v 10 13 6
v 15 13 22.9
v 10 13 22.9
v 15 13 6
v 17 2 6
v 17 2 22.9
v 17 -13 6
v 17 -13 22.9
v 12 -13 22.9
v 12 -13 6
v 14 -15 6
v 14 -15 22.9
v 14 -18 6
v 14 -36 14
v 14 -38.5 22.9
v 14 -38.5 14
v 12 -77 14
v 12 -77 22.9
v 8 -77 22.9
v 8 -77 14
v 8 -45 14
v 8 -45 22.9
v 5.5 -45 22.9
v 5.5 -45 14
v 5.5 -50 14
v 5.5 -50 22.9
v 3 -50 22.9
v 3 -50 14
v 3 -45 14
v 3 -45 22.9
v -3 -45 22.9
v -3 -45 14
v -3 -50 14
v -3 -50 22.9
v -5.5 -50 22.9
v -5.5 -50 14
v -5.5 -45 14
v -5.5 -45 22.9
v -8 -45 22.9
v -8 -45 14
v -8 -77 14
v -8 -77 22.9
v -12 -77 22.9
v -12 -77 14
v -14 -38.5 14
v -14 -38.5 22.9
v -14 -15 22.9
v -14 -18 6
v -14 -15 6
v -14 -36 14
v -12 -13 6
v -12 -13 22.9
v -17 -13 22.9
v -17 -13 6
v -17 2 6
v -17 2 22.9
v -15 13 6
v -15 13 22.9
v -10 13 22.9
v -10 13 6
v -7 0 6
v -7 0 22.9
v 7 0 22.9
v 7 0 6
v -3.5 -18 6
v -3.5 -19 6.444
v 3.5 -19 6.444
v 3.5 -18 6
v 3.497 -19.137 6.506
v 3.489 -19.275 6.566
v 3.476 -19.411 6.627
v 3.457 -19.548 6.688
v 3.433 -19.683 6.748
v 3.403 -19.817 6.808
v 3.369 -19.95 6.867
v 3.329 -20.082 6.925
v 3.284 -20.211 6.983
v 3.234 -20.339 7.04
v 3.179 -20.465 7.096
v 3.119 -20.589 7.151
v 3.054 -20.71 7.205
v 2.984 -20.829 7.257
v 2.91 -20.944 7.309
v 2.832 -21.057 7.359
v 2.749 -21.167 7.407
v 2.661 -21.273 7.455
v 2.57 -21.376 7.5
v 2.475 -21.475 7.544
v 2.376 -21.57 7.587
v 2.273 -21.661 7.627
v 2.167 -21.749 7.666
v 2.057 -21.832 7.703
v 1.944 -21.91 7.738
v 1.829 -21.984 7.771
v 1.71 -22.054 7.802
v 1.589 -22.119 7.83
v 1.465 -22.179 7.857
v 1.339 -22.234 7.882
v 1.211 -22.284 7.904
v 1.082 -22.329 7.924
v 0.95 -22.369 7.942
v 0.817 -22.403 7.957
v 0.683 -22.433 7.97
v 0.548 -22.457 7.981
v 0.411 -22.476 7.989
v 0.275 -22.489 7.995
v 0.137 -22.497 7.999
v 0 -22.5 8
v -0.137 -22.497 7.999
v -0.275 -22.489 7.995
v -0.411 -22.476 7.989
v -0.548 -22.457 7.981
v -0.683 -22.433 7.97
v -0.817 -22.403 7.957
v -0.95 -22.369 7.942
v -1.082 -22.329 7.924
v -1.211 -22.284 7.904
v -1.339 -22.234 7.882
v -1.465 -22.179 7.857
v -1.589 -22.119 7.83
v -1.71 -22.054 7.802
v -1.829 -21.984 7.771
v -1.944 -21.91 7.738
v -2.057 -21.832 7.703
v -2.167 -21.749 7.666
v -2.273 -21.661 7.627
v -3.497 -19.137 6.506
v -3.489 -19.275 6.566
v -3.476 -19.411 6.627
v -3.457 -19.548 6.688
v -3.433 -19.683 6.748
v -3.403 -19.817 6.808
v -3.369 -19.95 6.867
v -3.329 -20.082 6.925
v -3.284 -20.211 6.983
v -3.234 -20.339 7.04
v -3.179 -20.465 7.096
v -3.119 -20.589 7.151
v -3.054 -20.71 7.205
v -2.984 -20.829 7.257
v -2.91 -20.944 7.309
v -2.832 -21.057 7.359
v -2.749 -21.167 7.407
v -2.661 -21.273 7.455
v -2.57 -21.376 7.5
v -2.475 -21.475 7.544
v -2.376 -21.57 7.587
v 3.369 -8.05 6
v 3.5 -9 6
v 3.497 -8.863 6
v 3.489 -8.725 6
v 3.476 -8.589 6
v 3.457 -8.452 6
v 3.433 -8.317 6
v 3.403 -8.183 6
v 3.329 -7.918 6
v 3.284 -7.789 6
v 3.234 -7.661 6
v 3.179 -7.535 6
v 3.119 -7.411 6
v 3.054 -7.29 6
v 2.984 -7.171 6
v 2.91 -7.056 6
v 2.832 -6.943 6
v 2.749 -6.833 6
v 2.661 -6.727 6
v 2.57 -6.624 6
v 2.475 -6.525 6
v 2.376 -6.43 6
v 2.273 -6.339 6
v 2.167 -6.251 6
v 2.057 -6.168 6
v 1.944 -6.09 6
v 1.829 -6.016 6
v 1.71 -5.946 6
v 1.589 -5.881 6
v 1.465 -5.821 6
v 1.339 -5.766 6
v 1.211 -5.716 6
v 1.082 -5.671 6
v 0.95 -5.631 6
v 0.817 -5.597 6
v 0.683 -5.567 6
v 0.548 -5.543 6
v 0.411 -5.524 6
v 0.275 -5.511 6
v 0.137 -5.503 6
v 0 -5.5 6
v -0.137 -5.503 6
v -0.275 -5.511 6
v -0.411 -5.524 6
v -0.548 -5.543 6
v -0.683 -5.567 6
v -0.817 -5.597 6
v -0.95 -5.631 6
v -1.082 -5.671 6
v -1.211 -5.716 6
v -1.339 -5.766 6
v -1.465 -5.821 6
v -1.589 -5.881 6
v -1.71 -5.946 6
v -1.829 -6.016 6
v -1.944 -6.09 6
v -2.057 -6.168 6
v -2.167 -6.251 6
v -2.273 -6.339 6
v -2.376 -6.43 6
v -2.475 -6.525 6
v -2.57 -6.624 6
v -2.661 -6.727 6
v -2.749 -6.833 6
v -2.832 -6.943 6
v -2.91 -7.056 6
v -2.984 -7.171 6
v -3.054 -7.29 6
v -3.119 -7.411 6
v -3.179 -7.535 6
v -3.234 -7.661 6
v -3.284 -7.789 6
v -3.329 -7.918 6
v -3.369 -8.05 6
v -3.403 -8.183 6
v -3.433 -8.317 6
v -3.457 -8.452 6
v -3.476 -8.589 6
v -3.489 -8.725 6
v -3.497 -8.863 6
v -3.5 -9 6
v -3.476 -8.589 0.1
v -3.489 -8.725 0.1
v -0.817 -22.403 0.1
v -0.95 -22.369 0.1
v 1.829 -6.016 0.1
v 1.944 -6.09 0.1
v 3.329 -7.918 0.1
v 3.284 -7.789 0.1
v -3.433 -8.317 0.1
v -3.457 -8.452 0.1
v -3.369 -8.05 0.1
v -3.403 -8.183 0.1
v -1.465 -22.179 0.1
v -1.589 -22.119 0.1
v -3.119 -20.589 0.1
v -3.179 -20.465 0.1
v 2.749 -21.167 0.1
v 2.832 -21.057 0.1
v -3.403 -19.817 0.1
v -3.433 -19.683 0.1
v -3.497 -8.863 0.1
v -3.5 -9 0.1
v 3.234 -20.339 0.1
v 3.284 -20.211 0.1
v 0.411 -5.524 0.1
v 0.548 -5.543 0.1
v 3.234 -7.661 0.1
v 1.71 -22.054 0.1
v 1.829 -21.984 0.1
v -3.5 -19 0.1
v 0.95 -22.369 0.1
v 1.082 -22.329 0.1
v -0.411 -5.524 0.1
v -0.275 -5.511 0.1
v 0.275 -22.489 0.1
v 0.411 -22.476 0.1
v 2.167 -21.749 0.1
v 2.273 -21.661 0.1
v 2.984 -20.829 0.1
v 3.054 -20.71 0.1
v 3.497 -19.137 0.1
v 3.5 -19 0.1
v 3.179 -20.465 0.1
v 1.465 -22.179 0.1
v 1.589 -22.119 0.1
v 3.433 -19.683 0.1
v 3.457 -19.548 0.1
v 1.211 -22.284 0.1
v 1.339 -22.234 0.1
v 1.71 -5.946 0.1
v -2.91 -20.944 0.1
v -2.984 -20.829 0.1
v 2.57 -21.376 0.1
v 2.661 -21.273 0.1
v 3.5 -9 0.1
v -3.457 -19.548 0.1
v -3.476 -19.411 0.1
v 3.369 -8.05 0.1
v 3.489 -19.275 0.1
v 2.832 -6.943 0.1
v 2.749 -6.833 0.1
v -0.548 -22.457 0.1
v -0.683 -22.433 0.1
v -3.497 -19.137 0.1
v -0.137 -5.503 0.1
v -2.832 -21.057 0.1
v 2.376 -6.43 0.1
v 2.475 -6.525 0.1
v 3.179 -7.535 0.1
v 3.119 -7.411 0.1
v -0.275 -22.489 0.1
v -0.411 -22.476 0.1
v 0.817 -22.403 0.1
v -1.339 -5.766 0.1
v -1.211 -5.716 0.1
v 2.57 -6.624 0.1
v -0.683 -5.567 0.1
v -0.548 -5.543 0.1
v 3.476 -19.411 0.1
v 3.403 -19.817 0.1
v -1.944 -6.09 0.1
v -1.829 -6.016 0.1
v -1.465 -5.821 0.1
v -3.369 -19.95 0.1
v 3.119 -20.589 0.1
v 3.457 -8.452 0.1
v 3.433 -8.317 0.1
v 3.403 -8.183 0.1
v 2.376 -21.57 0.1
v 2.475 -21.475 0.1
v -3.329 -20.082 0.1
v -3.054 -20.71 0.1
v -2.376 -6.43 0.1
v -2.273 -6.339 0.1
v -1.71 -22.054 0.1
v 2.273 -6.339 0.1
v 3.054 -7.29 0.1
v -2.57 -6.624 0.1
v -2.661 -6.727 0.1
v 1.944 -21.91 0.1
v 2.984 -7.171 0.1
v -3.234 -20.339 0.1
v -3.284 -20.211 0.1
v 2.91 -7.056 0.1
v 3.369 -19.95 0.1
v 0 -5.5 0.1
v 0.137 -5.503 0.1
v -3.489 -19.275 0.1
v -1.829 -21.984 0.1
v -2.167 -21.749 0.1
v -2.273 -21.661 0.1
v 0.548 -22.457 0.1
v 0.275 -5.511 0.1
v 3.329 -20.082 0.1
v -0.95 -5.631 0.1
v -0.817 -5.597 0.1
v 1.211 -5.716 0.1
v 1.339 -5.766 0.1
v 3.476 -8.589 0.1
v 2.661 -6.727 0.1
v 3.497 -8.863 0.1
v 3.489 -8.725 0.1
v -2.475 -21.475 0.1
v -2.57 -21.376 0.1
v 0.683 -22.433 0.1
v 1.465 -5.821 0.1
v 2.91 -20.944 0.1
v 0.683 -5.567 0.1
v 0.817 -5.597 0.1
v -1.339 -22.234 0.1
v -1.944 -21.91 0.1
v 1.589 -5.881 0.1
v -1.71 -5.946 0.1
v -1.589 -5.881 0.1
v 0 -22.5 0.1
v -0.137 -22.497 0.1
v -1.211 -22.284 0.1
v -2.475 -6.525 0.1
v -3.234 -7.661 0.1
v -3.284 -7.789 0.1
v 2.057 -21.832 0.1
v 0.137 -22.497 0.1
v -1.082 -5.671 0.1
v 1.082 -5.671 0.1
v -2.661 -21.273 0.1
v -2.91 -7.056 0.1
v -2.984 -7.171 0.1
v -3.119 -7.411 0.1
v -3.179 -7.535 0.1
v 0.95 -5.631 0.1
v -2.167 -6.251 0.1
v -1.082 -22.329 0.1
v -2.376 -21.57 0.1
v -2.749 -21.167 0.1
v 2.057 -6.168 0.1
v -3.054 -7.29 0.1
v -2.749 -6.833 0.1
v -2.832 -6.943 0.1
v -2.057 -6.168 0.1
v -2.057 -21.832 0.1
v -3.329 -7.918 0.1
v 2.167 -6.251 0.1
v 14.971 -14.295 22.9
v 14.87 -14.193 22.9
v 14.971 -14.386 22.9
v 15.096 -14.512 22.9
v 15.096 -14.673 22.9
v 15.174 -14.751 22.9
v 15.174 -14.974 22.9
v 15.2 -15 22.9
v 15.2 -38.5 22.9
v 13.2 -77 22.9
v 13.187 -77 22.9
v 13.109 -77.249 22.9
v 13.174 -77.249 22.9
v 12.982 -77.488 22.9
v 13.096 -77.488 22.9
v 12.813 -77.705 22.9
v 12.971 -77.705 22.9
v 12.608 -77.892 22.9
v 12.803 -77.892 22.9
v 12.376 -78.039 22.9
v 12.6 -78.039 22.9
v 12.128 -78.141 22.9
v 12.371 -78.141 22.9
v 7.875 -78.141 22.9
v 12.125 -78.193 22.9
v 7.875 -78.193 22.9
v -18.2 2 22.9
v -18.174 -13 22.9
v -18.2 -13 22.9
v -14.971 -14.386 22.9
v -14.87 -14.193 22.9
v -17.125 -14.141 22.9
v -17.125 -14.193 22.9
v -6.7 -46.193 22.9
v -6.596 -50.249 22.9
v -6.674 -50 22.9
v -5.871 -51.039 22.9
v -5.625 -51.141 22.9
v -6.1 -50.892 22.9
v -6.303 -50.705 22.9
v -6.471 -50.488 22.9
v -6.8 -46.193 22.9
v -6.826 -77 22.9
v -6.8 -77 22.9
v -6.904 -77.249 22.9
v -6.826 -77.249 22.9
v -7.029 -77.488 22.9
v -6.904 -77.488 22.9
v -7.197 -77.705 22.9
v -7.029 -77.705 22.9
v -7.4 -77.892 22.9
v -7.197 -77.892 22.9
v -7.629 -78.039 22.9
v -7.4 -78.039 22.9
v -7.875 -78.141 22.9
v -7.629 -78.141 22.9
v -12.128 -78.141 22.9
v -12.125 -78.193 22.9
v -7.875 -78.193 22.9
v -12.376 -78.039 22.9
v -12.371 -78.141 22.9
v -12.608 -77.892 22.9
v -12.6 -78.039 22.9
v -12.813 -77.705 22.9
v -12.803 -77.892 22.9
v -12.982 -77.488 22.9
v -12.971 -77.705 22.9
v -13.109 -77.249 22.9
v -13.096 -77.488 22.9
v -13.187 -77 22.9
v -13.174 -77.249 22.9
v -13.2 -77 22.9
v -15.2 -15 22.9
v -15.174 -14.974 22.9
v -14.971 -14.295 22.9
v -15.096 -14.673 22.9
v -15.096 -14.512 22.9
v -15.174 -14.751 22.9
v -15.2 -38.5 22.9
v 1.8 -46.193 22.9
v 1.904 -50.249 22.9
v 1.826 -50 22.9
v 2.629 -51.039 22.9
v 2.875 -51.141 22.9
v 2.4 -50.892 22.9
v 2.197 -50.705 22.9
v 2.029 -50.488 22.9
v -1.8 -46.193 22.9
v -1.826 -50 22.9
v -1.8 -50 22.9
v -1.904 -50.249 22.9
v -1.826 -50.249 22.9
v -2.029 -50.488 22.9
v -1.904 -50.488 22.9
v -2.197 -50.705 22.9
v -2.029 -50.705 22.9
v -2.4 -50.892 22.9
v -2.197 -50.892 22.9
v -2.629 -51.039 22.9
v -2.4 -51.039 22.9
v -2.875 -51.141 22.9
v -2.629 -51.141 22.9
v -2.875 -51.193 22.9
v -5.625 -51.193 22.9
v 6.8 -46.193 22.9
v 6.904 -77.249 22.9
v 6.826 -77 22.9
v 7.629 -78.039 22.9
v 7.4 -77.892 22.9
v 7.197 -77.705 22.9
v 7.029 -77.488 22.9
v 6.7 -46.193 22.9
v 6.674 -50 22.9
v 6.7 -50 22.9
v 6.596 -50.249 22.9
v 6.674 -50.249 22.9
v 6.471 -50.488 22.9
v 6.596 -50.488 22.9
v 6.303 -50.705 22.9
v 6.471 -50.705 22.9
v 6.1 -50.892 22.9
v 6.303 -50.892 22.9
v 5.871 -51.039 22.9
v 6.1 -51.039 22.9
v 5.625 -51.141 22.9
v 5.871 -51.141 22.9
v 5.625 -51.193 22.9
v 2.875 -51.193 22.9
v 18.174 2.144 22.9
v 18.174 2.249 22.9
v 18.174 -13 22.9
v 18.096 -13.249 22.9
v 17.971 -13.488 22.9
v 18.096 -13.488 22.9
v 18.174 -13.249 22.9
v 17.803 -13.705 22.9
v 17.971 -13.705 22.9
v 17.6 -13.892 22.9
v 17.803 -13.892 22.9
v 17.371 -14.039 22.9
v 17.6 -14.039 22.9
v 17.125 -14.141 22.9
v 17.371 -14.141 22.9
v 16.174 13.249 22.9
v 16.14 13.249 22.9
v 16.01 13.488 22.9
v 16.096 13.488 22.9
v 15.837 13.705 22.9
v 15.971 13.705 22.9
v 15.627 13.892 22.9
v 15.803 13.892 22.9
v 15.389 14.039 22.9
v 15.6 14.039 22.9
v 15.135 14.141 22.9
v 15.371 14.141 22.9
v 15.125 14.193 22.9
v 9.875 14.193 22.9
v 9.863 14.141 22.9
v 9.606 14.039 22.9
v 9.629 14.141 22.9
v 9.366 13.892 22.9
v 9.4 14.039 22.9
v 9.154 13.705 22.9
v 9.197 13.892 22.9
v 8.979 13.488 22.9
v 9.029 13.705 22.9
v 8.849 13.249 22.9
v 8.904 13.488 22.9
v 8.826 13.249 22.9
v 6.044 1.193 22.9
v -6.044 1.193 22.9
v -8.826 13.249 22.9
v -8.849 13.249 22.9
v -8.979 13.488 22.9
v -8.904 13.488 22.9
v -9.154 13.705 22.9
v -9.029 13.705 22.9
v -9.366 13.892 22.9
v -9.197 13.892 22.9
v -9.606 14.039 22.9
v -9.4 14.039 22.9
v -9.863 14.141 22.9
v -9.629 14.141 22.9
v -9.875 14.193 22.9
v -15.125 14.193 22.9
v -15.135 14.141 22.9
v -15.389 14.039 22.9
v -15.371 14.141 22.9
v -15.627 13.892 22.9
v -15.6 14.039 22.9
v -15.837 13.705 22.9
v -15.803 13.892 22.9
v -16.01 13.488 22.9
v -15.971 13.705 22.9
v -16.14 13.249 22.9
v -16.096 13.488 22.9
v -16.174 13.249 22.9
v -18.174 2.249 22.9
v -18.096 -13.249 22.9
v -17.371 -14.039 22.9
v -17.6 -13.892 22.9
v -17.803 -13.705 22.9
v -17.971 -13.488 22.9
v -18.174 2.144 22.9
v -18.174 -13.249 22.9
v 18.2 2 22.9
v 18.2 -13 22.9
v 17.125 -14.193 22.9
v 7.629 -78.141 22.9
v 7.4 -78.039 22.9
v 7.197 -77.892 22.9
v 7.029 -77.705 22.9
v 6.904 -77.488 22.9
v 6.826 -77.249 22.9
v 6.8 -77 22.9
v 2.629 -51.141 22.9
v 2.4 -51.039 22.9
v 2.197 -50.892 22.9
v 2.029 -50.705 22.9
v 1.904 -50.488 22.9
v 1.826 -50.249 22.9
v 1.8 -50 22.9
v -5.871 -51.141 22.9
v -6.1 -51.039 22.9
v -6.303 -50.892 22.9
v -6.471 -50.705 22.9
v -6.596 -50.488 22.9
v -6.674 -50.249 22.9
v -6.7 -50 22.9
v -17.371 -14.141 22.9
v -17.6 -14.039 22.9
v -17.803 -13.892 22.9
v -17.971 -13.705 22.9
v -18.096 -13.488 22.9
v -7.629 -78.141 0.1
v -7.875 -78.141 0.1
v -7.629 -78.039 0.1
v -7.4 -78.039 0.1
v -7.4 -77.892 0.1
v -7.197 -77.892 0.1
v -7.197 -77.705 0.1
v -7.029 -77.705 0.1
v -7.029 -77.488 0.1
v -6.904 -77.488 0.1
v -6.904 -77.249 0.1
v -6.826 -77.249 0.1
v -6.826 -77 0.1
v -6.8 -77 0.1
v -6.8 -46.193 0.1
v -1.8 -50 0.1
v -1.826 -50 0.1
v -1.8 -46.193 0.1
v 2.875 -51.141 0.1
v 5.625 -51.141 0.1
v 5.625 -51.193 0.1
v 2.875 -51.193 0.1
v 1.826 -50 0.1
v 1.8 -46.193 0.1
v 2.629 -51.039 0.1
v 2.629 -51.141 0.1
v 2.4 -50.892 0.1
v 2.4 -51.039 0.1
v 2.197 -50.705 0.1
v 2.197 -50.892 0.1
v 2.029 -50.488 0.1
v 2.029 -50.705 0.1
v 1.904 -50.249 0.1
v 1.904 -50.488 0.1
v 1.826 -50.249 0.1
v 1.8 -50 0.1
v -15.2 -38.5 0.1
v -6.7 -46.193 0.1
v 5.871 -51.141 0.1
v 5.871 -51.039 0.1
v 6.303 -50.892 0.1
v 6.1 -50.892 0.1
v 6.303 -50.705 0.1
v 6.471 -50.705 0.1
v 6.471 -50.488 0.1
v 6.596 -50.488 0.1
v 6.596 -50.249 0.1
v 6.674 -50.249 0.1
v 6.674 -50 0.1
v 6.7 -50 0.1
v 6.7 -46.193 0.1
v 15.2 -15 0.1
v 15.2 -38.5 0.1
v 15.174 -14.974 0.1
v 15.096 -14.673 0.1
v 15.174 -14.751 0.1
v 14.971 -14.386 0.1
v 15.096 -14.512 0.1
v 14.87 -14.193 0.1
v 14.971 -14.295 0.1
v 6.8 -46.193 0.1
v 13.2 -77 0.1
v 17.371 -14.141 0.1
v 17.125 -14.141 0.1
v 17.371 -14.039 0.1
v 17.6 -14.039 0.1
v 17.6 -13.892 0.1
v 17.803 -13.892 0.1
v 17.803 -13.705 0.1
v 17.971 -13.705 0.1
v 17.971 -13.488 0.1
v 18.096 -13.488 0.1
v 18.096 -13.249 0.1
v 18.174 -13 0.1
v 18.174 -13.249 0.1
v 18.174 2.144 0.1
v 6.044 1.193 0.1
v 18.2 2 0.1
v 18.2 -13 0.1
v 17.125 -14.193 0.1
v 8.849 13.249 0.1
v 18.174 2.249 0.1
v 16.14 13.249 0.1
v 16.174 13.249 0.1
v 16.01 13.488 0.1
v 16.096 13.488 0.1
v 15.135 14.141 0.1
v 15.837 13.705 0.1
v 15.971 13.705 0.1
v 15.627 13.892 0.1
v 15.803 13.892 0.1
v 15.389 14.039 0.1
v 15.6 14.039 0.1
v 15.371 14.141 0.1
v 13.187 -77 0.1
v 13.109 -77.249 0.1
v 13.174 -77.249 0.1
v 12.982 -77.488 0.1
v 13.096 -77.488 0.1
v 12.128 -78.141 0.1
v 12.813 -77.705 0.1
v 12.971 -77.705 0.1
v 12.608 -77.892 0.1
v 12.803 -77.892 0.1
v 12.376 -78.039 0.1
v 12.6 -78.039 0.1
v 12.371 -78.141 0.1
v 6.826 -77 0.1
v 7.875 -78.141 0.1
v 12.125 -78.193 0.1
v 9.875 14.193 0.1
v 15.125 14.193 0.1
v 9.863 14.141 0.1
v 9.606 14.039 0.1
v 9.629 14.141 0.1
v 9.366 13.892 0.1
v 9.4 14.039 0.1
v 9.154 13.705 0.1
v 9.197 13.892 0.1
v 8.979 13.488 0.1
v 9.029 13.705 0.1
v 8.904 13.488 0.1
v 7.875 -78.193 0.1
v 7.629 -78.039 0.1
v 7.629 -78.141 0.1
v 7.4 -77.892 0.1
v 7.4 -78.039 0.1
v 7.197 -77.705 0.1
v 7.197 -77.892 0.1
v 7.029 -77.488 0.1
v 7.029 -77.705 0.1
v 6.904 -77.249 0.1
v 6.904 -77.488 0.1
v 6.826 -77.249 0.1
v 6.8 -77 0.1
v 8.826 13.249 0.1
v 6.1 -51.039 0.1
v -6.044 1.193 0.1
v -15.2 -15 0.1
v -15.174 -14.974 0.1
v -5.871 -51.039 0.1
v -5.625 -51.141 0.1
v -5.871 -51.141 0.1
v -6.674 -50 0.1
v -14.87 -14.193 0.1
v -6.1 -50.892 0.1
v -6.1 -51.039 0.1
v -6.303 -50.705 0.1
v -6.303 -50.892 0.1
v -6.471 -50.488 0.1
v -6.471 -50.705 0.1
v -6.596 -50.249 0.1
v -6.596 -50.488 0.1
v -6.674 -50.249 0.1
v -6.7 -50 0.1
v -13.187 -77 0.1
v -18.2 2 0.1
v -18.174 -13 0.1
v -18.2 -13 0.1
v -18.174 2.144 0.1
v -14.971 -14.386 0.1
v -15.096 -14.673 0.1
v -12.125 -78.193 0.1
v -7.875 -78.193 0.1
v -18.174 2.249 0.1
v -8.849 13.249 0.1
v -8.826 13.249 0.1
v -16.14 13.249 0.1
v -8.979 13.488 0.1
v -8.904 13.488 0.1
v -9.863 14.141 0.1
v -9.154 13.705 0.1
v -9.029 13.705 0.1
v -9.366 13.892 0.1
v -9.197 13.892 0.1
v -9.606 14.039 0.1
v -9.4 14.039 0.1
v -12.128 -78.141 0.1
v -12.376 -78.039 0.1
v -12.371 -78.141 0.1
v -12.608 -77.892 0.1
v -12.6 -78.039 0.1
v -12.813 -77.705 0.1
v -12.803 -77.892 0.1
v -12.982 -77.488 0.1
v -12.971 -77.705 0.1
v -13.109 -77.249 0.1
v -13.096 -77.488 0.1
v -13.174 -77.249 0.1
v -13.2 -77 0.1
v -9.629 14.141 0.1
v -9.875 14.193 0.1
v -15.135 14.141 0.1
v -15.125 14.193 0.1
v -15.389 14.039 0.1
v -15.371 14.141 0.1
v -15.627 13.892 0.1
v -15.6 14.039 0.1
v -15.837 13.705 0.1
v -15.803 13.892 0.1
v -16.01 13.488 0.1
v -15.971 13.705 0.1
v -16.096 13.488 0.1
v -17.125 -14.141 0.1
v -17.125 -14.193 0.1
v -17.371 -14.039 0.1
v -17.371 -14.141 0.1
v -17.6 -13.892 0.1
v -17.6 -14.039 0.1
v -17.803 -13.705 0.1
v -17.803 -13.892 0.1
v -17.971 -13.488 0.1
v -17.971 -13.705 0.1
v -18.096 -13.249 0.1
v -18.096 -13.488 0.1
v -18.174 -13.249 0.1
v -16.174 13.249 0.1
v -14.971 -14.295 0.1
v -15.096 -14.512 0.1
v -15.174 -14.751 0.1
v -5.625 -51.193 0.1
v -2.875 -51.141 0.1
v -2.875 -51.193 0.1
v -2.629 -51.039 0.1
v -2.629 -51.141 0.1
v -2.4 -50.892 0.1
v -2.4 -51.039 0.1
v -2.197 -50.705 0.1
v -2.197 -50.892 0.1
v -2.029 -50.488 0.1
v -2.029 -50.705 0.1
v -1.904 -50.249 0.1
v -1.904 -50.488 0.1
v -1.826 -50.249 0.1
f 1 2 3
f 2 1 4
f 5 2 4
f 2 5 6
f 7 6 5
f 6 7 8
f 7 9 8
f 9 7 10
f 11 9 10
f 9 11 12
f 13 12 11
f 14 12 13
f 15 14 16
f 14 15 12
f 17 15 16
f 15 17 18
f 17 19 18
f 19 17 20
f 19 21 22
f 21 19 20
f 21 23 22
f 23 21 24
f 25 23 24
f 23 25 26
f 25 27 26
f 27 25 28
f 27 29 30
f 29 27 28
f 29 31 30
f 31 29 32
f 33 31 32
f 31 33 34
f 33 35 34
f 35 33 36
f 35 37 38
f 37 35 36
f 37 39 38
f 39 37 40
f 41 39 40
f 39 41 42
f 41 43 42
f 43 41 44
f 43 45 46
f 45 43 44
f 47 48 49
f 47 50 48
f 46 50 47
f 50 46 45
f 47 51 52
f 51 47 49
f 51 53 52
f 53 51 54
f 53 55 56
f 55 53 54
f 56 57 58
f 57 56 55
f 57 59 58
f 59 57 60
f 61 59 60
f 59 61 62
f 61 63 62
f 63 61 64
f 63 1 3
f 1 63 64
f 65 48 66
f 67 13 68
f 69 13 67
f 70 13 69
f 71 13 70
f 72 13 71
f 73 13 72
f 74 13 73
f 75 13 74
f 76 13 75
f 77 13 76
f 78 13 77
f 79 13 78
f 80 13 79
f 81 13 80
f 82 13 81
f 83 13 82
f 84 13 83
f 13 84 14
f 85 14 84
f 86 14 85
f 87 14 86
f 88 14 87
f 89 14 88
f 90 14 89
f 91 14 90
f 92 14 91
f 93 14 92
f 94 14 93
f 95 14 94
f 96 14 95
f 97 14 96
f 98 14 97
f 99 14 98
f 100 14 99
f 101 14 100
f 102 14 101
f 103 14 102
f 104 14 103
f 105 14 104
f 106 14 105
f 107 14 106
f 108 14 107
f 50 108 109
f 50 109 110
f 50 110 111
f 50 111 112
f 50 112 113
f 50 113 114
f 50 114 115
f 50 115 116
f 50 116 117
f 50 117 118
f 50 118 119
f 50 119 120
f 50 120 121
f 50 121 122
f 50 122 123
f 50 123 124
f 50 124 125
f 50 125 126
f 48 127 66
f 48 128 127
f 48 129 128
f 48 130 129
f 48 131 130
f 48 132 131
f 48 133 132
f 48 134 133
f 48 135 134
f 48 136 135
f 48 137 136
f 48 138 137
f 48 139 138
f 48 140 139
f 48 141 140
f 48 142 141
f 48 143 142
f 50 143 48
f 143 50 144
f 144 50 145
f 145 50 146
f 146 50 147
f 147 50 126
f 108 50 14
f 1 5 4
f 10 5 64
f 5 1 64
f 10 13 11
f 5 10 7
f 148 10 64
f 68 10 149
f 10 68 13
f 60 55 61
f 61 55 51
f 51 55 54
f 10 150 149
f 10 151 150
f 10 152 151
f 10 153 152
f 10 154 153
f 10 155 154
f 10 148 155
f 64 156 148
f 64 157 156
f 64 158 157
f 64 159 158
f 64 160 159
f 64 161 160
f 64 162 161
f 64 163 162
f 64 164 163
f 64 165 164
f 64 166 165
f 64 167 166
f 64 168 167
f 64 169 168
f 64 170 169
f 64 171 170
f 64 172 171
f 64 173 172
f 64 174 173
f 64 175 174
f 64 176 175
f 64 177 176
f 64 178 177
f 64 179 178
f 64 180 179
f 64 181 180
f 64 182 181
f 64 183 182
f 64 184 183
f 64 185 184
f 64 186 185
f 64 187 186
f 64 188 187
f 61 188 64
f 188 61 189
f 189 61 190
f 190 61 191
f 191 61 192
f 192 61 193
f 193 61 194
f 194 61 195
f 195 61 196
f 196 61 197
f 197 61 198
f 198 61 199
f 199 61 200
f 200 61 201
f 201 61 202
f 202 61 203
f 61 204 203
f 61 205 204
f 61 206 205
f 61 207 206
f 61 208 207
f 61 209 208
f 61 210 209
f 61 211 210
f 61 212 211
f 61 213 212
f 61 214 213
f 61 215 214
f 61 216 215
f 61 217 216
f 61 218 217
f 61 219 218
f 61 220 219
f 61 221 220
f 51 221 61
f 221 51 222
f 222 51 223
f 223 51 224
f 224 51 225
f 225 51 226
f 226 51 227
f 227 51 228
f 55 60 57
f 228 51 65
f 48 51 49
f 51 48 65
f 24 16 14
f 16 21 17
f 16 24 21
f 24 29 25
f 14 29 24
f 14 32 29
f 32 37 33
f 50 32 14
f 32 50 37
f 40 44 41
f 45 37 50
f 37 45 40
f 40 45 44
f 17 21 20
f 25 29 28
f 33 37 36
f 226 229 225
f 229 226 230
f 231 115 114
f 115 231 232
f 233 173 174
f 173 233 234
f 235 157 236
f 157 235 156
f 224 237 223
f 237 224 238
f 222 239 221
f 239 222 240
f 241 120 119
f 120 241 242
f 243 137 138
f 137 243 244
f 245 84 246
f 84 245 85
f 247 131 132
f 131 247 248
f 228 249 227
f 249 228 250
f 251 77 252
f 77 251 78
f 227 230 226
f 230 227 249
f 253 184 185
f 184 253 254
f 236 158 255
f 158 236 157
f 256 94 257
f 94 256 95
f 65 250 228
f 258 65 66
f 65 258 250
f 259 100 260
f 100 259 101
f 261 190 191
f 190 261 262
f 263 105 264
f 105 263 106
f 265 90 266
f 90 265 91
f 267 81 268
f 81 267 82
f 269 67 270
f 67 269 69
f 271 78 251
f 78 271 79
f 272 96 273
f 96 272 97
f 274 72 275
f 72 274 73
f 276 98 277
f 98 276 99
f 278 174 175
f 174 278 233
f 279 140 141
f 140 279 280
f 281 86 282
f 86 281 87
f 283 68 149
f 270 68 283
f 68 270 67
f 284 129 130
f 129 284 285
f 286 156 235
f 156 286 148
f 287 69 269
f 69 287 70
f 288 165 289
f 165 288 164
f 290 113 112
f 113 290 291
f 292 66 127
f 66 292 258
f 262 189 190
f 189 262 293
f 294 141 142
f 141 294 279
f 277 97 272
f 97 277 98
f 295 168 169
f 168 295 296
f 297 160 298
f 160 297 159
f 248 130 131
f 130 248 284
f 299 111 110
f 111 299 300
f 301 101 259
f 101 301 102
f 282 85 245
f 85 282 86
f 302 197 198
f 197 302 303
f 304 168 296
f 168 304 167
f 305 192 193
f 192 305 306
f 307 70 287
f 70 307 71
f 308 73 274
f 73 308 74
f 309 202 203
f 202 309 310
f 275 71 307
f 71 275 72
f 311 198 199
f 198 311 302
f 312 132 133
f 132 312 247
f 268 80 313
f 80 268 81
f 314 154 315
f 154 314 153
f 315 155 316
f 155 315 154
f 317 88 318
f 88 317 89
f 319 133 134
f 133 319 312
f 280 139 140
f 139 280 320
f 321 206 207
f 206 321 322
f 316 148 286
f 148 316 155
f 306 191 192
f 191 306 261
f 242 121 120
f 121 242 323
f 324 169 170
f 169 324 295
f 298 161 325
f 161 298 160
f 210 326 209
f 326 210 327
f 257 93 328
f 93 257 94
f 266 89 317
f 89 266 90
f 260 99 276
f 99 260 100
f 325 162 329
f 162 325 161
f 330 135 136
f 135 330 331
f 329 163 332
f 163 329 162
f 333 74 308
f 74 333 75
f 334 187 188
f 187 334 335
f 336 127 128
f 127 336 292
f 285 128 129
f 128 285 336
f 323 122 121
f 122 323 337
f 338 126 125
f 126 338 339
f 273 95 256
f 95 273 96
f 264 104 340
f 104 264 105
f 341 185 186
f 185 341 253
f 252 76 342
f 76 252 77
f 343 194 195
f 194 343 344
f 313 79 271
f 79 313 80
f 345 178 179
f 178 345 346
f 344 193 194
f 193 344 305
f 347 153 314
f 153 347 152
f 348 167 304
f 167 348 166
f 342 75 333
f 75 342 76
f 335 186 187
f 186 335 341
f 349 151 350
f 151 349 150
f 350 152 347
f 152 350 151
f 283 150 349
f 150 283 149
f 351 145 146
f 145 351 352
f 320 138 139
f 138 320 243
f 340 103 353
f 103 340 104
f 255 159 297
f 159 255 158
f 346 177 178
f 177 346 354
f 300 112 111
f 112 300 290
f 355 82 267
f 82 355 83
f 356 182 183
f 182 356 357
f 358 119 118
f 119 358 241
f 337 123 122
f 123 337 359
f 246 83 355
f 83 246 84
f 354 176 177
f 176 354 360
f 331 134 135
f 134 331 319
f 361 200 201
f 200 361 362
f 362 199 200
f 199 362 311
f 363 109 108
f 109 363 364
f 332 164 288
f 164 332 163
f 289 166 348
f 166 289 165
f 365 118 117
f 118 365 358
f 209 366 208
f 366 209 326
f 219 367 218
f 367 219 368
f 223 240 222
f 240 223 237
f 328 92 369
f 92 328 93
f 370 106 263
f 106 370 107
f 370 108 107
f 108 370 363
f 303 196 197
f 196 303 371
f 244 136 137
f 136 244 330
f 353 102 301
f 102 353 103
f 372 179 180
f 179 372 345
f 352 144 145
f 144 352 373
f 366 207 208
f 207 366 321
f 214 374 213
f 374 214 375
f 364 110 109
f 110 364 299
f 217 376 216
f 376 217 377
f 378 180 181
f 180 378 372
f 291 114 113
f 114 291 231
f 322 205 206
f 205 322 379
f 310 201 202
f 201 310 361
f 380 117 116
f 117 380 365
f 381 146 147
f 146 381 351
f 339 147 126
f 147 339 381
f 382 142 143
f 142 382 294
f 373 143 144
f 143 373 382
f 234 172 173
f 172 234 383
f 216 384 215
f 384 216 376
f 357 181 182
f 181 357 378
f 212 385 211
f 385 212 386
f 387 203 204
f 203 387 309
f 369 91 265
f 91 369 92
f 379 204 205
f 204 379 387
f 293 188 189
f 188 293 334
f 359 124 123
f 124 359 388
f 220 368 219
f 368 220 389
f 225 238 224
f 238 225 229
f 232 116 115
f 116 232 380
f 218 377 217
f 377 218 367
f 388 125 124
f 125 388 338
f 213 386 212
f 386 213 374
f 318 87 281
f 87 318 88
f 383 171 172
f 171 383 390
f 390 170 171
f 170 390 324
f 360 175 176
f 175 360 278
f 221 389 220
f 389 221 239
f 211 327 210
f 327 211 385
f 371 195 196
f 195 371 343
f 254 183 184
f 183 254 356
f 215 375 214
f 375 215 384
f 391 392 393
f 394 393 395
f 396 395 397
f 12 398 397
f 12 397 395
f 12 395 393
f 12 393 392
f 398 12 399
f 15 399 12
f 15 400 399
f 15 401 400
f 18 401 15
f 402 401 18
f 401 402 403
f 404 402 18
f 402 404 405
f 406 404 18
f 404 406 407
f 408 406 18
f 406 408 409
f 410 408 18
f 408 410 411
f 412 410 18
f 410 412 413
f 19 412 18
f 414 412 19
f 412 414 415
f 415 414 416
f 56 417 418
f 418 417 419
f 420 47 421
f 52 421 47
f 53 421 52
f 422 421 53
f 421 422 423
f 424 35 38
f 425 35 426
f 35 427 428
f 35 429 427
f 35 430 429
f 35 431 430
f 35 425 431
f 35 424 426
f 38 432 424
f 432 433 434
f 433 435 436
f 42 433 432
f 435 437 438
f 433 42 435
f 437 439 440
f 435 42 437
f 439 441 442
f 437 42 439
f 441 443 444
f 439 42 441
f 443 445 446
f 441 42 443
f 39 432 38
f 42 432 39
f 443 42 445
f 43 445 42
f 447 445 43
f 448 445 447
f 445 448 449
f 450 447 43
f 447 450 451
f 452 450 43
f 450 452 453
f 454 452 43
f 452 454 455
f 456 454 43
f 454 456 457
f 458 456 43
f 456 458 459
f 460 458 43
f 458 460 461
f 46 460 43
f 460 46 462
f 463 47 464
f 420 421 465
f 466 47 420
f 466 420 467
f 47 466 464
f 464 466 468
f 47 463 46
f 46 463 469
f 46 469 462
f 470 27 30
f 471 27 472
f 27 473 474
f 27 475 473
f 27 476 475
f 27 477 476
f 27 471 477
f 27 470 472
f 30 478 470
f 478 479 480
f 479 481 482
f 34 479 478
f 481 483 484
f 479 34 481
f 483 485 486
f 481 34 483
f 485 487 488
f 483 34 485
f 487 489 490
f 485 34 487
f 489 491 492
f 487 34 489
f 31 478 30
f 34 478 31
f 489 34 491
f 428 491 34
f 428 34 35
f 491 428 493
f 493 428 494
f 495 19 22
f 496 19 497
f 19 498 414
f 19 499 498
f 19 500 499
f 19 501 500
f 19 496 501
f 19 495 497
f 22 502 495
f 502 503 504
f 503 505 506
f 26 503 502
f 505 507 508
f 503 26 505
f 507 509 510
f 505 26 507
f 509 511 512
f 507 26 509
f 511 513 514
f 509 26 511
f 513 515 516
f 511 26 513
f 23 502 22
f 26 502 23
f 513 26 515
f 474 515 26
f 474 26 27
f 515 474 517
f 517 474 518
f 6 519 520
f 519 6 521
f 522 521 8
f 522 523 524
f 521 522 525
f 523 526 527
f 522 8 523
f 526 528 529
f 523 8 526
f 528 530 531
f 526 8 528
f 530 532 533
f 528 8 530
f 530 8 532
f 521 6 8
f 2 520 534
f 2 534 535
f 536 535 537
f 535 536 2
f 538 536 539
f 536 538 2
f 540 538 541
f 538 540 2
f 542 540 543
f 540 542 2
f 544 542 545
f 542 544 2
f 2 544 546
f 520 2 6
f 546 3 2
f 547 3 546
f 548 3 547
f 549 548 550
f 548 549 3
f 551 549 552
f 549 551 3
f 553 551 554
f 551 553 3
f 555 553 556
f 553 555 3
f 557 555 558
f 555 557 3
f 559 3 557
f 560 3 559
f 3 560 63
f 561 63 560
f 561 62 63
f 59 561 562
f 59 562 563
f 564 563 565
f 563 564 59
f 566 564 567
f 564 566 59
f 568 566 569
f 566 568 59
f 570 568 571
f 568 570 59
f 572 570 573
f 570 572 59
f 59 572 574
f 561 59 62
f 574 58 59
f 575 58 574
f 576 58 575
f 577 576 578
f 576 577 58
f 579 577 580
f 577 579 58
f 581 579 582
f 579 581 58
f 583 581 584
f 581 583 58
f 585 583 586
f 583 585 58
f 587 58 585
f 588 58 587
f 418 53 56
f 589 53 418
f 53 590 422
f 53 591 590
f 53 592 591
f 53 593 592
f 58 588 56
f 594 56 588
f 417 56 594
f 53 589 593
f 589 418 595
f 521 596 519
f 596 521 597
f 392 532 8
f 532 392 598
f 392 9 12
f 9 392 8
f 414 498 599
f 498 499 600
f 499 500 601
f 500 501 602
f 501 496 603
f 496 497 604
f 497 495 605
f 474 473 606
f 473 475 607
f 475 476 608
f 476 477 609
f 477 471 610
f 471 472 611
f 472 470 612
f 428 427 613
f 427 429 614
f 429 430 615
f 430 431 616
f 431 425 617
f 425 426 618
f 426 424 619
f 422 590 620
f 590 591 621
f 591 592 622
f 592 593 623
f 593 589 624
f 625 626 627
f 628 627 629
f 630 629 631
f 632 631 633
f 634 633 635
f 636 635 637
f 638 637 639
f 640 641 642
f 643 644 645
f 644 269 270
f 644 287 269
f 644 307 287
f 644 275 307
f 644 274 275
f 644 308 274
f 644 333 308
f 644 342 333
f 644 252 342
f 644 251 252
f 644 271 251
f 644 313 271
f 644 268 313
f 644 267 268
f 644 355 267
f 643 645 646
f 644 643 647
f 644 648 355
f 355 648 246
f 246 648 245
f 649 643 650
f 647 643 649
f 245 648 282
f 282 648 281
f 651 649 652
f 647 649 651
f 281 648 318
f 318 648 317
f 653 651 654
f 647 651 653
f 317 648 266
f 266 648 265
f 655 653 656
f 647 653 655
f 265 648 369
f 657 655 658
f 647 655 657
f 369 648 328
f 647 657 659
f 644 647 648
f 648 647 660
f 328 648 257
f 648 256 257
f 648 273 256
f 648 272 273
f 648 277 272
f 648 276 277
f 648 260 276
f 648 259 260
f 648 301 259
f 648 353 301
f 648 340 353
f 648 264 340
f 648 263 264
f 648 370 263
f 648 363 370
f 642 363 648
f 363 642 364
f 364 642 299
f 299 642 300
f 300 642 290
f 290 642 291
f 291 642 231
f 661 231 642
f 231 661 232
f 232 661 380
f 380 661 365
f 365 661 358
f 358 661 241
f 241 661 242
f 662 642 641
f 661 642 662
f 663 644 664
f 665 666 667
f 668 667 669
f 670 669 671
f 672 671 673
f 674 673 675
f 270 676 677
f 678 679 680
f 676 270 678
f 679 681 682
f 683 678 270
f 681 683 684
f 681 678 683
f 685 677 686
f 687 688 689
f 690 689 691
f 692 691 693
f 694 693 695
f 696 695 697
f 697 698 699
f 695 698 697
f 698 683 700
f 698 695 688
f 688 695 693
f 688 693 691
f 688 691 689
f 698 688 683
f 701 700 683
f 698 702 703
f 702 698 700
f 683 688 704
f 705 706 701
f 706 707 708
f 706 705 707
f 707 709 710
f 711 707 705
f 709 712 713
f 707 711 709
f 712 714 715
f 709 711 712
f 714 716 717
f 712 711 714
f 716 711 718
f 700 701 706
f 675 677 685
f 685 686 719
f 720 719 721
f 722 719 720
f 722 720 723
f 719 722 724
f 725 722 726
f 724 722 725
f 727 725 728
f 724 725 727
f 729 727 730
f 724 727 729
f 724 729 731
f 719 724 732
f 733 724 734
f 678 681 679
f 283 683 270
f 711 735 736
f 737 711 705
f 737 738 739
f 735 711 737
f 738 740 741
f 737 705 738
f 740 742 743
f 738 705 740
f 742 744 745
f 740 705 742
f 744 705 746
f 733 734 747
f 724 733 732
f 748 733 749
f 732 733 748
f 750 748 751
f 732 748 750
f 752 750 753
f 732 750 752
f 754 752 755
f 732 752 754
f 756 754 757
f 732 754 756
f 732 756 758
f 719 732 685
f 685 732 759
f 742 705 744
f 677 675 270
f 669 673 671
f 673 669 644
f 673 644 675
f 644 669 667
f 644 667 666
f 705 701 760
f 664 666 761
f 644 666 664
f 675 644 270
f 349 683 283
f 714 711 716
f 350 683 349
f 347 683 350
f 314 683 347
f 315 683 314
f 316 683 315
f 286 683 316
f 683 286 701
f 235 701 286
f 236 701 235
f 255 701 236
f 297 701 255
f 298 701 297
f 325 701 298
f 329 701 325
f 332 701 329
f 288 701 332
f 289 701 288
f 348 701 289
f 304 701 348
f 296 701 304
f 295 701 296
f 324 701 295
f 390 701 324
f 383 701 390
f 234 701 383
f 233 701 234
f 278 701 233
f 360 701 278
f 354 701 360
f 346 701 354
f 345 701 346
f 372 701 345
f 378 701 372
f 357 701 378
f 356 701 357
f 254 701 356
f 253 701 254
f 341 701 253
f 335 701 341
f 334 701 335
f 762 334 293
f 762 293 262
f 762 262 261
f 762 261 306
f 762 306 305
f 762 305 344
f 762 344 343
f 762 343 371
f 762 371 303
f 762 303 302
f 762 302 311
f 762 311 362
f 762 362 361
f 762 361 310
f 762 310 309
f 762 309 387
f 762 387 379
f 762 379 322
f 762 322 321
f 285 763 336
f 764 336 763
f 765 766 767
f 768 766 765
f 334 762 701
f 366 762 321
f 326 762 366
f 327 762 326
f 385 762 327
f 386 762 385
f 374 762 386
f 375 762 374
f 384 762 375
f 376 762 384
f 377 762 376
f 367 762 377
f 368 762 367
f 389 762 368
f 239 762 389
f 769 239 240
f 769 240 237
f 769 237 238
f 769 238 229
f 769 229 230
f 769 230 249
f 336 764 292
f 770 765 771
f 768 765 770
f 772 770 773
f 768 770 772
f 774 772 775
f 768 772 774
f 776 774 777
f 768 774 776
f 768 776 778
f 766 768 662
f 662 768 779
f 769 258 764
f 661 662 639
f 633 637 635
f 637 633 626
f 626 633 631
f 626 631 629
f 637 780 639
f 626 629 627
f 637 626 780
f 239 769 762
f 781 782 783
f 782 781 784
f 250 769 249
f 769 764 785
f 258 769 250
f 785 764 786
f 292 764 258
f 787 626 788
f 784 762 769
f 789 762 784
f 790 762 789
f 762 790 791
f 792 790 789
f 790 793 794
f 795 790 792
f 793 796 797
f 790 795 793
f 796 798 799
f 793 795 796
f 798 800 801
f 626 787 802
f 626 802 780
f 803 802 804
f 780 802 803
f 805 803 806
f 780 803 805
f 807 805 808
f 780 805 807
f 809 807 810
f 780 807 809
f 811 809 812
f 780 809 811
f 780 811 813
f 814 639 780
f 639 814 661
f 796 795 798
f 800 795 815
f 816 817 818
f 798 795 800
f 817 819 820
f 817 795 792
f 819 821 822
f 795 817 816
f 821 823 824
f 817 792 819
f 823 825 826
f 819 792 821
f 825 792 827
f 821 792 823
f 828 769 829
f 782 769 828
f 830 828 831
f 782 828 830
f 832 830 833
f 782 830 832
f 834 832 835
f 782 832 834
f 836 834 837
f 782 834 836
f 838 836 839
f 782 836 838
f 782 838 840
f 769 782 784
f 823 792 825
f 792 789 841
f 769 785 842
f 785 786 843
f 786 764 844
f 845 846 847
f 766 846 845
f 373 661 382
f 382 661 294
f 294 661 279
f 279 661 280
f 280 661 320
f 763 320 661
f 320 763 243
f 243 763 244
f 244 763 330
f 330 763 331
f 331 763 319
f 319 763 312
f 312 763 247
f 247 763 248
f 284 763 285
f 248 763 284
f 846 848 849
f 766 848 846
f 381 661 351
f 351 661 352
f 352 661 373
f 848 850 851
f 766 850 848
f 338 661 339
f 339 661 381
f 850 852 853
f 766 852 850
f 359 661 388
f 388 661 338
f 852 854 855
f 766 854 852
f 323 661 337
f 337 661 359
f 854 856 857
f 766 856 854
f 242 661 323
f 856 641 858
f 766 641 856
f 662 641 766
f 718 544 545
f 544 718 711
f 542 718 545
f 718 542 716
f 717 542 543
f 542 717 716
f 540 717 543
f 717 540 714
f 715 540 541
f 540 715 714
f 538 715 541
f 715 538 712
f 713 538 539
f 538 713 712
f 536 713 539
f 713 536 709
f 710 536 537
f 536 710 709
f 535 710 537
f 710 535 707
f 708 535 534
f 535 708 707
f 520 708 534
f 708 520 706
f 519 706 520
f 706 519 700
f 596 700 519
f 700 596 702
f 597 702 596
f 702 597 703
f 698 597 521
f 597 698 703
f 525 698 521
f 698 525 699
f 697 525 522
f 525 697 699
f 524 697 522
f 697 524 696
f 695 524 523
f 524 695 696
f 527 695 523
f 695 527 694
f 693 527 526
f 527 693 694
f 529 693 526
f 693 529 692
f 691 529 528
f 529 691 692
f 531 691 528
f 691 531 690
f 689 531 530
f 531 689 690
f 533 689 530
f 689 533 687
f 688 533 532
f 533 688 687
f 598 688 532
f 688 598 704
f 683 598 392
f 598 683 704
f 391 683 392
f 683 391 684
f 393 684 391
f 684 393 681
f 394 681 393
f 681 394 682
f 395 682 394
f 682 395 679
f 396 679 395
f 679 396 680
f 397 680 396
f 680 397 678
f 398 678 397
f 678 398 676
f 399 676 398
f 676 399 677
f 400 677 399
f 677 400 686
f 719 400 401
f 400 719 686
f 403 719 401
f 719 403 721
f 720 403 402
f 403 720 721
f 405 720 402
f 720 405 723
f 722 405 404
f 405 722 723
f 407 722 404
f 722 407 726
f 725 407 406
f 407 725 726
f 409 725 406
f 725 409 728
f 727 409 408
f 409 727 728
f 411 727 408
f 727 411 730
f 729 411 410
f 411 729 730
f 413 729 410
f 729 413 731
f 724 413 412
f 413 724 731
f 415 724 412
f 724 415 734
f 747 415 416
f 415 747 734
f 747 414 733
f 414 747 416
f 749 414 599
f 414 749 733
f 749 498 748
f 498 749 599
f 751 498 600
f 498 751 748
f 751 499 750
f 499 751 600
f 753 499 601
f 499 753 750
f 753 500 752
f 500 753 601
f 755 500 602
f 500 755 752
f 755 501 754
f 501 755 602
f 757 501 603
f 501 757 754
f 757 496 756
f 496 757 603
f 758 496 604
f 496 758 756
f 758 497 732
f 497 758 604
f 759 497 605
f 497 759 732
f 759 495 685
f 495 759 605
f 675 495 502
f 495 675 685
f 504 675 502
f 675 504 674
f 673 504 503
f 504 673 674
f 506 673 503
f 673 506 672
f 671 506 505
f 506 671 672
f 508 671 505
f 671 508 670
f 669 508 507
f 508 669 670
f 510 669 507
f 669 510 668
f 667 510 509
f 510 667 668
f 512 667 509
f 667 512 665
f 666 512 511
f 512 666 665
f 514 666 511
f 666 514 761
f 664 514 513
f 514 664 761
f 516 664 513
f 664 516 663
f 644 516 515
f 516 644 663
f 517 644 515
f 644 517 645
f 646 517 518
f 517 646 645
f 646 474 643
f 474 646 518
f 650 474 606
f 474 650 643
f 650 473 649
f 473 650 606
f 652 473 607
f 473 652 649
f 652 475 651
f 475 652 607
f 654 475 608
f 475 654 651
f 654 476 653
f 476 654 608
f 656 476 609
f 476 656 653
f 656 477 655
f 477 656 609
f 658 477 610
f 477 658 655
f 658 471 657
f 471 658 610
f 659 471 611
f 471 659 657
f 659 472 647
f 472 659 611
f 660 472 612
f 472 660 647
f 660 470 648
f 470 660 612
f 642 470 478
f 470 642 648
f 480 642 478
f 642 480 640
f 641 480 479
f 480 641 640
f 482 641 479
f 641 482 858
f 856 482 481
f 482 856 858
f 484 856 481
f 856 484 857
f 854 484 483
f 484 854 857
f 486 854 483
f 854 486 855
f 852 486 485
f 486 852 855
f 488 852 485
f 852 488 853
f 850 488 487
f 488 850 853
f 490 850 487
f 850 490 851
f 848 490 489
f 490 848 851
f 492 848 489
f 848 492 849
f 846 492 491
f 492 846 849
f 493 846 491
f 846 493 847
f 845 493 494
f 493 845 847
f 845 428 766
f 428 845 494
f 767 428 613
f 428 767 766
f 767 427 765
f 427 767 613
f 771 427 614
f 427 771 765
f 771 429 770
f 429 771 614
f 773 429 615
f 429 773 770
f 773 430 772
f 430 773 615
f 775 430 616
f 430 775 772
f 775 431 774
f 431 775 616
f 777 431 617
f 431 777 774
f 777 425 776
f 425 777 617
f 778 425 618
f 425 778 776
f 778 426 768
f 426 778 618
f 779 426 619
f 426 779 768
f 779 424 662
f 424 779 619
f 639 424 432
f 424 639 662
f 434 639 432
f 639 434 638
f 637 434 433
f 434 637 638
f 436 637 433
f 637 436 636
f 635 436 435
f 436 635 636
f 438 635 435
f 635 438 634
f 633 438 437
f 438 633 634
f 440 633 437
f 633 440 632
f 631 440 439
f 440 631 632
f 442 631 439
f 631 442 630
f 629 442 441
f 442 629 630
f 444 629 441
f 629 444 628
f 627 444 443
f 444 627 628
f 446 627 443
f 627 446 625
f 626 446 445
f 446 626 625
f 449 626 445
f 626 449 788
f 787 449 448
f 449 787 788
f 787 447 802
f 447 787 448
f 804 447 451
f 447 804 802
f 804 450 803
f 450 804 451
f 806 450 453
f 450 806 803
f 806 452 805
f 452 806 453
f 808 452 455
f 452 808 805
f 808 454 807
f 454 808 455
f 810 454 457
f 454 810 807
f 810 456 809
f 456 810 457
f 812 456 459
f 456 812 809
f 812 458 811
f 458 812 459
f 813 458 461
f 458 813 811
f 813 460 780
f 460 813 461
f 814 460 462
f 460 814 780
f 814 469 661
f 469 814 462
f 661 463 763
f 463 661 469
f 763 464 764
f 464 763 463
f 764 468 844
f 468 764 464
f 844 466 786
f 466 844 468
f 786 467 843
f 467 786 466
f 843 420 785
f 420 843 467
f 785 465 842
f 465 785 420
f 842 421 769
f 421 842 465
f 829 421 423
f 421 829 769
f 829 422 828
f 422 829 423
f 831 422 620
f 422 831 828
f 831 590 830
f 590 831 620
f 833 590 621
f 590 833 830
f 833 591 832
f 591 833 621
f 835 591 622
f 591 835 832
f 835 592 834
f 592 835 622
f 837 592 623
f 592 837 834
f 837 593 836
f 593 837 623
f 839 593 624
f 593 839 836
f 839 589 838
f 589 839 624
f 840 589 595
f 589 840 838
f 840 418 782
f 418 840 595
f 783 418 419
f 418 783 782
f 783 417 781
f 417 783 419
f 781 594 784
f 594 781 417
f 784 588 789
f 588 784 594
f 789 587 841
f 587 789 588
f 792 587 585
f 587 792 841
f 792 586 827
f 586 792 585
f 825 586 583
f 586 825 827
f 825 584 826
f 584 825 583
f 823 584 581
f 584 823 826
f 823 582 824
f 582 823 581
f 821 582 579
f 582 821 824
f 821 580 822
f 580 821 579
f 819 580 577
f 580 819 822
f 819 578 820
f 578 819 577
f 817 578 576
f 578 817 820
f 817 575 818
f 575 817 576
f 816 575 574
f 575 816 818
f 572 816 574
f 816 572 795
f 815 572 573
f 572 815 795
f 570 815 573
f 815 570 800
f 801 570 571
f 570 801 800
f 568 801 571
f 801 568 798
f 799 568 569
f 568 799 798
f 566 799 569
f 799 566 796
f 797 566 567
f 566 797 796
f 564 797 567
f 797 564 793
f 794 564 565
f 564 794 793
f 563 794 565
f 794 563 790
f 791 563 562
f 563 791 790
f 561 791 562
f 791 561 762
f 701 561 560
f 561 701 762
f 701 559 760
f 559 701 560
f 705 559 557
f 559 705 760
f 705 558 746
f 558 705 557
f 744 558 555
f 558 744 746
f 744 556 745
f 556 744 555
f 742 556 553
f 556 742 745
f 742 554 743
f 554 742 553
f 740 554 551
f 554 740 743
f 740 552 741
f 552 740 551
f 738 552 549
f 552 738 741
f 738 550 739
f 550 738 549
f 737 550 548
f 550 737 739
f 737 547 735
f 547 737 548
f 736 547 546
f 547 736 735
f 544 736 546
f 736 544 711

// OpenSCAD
/* u-wing-bin.scad
 *
 * Copyright (C) Robert B. Ross, 2017
 *
 * This software is released under the Creative Commons
 * Attribution-ShareAlike 4.0 International Public License.
 *
 * Note: This is an ugly one -- not a great example.
 */

include <./bintools.scad>

$fn=160;
binHeight = 46.5/2;
blankHeight = 23; // VERY CLOSE!!!
angle=0;

/* locations is a pair of triples, translate : rotate pairs
 */
locations = [[[20,-39.5,0], [0,0,0]],
             [[-20,39.5,0],[0,0,180]]];

//harborFreightLargeHalfHt(locations,inset=1) uwingBlank();

// uwingBlank();
uwingOutline();

/* uwingOutline() -- test piece for outline
 */
module uwingOutline() {
   translate([0,0,blankHeight]) rotate([180,0,0]) {
      blankCutout(height=blankHeight - 0.1, outlineScale=1.2) uwingBlank();
   }
}

module uwingBlank(centerCutout=1) {
   
   /* rotate, etc. positions blank upside-down on XY plane */
   union() {
      difference() {
         linear_extrude(height=blankHeight) uwingShell();
         translate([0,0,2.75]) bottomAngleCutout(); // translate is kludge
      }
      if (centerCutout) linear_extrude(height=binHeight) centerCutoutPoly();
   } /* rotate, translate, union */
}

/* uwingShell() -- outline */
module uwingShell() {
   for (i=[0:1]) mirror([i,0,0]) 
      polygon(points=[[-0.1,0],[7,0],[10,-13],[15,-13],[17,-2],[17,13],
                      [12,13],[14,15],[14,38.5],[12,77],[8,77],[8,45],
                      [5.5,45],[5.5,50],[3,50],[3,45],[-0.1,45]
                     ]);
}

/* bottomAngleCutout() -- defines the "height" of the bottom of the blank,
 *                        where it touches the model.
 *
 * Notes:
 * - "height" in the linear extrude corresponds to the width of the model
 *   in the X dimension.
 */
module bottomAngleCutout() {
   width = 60;

   rotate([0,0,180]) translate([-width/2,-66,binHeight]) rotate([0,90,0]) linear_extrude(height=width)
      polygon(points=[[-0.1,-14],[17,-14],[17,30],[9,48],[9,80],[-0.1,80]]);
}

/* centerCutoutPoly() -- defines a polygon to be cut all the way to the
 *                       bottom of the bin.
 */
module centerCutoutPoly() {
   hull() {
      translate([0,9,0]) circle(r=3.5);
      translate([0,19,0]) circle(r=3.5);
   }
}

/*
 * Local variables:
 *  mode: C
 *  c-indent-level: 3
 *  c-basic-offset: 3
 * End:
 *
 * vim: ts=8 sts=3 sw=3 expandtab
 */
